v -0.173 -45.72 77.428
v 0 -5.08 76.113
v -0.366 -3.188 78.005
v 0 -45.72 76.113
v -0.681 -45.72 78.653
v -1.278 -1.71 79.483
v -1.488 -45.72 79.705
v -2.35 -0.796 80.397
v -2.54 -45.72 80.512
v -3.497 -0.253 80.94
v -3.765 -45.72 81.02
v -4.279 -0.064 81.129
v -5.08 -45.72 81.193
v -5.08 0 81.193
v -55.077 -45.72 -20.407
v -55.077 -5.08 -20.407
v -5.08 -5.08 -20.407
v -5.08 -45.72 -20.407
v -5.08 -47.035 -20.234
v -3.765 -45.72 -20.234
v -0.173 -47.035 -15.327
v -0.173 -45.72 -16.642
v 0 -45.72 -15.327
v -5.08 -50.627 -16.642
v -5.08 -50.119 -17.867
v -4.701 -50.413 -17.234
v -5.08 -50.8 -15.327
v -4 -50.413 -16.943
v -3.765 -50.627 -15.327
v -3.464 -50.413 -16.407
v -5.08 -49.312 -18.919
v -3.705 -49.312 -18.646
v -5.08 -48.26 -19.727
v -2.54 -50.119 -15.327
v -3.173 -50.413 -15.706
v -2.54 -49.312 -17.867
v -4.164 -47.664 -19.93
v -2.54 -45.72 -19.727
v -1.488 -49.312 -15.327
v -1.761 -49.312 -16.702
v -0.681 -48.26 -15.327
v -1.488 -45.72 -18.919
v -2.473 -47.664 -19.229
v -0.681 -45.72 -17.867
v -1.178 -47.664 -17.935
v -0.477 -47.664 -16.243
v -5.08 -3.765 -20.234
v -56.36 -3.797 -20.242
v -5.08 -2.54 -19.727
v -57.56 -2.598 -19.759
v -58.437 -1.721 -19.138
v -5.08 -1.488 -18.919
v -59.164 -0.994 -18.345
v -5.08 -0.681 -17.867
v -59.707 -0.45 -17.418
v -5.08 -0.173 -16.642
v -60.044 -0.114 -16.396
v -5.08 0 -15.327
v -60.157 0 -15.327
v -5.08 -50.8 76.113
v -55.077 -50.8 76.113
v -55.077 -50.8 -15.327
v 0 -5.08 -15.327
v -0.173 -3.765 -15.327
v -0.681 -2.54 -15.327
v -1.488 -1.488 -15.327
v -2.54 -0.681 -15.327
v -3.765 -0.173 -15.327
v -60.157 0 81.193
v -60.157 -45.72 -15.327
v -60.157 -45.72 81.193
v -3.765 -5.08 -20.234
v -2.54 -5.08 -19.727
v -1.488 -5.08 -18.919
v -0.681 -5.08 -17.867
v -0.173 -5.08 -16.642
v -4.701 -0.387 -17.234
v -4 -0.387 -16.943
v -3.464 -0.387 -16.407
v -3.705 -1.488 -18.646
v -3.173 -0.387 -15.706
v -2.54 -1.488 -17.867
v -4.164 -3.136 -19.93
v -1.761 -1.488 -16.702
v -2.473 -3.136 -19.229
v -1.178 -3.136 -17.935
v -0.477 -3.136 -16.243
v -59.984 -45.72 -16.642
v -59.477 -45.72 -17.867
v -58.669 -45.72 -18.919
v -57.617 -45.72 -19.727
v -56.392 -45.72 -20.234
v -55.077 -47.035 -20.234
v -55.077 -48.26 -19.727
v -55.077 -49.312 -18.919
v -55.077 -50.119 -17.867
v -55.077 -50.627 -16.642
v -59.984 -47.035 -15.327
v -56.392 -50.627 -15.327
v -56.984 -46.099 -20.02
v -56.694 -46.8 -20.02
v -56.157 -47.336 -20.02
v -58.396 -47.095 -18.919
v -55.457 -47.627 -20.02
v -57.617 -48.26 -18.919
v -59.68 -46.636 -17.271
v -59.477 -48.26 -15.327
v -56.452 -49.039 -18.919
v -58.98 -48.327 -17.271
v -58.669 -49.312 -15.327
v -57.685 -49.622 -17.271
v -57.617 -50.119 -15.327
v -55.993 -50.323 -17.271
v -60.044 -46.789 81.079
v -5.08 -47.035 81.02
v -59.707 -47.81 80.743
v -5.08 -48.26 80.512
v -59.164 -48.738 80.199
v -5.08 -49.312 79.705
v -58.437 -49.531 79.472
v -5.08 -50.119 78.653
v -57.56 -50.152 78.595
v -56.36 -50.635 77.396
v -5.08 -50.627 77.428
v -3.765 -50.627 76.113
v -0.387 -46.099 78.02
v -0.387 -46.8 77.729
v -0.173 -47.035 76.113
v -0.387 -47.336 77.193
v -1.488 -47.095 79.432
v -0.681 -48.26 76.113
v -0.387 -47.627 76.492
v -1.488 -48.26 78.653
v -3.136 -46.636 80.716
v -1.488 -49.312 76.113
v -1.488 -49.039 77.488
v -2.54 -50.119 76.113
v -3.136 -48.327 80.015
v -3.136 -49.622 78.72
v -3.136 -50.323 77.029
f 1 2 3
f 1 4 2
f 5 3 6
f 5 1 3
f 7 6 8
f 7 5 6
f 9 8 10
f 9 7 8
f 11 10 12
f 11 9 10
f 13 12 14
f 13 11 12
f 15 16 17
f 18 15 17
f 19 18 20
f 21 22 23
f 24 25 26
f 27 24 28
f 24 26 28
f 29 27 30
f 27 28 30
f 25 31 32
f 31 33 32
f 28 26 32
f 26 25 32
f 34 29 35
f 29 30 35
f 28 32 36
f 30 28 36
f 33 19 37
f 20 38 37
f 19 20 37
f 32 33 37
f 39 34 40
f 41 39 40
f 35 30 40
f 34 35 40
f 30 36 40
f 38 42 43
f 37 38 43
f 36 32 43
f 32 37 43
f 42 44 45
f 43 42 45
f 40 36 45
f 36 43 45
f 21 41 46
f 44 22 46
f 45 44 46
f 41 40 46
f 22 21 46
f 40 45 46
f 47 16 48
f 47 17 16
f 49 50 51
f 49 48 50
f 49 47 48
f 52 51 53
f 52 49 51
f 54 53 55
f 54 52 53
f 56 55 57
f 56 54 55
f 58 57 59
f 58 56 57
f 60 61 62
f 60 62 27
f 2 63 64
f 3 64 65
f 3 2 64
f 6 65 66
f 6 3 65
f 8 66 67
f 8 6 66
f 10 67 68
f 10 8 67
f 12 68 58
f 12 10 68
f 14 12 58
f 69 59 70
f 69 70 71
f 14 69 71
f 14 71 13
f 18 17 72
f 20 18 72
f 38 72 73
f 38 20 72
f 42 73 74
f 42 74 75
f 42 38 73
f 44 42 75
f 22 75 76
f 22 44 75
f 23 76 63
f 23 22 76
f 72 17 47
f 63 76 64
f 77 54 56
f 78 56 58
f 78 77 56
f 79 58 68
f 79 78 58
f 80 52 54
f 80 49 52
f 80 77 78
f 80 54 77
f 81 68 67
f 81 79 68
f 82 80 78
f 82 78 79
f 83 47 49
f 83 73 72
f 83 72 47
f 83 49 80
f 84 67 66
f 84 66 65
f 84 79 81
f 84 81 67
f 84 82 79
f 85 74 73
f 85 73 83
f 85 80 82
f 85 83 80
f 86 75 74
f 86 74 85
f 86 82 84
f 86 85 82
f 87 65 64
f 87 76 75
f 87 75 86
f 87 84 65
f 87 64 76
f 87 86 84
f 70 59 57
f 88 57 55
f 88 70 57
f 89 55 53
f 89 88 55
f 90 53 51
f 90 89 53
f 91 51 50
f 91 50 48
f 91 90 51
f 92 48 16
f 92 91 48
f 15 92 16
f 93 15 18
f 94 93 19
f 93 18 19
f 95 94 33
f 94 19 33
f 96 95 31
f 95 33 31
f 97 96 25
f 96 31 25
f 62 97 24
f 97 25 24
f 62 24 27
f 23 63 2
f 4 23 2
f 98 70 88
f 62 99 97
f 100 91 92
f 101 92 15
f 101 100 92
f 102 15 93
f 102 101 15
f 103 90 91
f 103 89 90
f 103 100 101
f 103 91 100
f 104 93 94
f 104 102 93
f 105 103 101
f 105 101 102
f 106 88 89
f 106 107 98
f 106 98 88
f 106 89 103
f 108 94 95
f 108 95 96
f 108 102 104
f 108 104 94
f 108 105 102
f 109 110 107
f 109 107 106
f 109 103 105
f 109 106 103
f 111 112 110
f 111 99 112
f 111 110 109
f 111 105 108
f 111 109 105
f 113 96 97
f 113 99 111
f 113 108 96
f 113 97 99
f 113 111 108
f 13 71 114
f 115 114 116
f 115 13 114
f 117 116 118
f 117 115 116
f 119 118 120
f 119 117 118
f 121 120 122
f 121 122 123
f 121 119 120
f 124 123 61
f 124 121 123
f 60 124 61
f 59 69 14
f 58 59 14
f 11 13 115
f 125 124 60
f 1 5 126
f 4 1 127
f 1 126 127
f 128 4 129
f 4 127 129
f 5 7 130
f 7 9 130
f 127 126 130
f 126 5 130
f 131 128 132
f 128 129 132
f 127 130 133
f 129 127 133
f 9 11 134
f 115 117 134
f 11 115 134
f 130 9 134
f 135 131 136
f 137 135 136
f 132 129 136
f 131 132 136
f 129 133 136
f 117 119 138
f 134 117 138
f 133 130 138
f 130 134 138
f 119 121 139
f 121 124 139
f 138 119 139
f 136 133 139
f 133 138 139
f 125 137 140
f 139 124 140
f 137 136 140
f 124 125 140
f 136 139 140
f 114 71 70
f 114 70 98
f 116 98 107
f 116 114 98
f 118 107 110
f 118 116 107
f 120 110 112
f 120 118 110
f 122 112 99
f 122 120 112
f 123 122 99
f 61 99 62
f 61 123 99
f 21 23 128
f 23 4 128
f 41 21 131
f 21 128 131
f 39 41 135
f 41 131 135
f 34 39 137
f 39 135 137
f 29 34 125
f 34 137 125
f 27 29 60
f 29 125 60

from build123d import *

# Parameters (mm, degrees)
F0_W     = 60.157363
F0_H     = 101.6
F1_DEPTH = 50.8
F2_R     = 5.08


with BuildPart() as f1:
    # F0 (on Front) → F1 (new body)
    with BuildSketch(Plane.XZ):
        with Locations((-30.078681, 30.392907)):
            Rectangle(F0_W, F0_H)
    extrude(amount=F1_DEPTH)

    # F2
    f2_edges = [f1.edges().sort_by_distance(p)[0] for p in [
        (-30.078682, -50.8, 81.192907),
        (-60.157363, -50.8, 30.392907),
        (-60.157363, -25.4, -20.407093),
        (0, -25.4, -20.407093),
        (-30.078682, 0, -20.407093),
        (-30.078682, -50.8, -20.407093),
        (0, -25.4, 81.192907),
        (0, 0, 30.392907),
        (0, -50.8, 30.392907),
    ]]
    fillet(f2_edges, radius=F2_R)


solid = f1.part
